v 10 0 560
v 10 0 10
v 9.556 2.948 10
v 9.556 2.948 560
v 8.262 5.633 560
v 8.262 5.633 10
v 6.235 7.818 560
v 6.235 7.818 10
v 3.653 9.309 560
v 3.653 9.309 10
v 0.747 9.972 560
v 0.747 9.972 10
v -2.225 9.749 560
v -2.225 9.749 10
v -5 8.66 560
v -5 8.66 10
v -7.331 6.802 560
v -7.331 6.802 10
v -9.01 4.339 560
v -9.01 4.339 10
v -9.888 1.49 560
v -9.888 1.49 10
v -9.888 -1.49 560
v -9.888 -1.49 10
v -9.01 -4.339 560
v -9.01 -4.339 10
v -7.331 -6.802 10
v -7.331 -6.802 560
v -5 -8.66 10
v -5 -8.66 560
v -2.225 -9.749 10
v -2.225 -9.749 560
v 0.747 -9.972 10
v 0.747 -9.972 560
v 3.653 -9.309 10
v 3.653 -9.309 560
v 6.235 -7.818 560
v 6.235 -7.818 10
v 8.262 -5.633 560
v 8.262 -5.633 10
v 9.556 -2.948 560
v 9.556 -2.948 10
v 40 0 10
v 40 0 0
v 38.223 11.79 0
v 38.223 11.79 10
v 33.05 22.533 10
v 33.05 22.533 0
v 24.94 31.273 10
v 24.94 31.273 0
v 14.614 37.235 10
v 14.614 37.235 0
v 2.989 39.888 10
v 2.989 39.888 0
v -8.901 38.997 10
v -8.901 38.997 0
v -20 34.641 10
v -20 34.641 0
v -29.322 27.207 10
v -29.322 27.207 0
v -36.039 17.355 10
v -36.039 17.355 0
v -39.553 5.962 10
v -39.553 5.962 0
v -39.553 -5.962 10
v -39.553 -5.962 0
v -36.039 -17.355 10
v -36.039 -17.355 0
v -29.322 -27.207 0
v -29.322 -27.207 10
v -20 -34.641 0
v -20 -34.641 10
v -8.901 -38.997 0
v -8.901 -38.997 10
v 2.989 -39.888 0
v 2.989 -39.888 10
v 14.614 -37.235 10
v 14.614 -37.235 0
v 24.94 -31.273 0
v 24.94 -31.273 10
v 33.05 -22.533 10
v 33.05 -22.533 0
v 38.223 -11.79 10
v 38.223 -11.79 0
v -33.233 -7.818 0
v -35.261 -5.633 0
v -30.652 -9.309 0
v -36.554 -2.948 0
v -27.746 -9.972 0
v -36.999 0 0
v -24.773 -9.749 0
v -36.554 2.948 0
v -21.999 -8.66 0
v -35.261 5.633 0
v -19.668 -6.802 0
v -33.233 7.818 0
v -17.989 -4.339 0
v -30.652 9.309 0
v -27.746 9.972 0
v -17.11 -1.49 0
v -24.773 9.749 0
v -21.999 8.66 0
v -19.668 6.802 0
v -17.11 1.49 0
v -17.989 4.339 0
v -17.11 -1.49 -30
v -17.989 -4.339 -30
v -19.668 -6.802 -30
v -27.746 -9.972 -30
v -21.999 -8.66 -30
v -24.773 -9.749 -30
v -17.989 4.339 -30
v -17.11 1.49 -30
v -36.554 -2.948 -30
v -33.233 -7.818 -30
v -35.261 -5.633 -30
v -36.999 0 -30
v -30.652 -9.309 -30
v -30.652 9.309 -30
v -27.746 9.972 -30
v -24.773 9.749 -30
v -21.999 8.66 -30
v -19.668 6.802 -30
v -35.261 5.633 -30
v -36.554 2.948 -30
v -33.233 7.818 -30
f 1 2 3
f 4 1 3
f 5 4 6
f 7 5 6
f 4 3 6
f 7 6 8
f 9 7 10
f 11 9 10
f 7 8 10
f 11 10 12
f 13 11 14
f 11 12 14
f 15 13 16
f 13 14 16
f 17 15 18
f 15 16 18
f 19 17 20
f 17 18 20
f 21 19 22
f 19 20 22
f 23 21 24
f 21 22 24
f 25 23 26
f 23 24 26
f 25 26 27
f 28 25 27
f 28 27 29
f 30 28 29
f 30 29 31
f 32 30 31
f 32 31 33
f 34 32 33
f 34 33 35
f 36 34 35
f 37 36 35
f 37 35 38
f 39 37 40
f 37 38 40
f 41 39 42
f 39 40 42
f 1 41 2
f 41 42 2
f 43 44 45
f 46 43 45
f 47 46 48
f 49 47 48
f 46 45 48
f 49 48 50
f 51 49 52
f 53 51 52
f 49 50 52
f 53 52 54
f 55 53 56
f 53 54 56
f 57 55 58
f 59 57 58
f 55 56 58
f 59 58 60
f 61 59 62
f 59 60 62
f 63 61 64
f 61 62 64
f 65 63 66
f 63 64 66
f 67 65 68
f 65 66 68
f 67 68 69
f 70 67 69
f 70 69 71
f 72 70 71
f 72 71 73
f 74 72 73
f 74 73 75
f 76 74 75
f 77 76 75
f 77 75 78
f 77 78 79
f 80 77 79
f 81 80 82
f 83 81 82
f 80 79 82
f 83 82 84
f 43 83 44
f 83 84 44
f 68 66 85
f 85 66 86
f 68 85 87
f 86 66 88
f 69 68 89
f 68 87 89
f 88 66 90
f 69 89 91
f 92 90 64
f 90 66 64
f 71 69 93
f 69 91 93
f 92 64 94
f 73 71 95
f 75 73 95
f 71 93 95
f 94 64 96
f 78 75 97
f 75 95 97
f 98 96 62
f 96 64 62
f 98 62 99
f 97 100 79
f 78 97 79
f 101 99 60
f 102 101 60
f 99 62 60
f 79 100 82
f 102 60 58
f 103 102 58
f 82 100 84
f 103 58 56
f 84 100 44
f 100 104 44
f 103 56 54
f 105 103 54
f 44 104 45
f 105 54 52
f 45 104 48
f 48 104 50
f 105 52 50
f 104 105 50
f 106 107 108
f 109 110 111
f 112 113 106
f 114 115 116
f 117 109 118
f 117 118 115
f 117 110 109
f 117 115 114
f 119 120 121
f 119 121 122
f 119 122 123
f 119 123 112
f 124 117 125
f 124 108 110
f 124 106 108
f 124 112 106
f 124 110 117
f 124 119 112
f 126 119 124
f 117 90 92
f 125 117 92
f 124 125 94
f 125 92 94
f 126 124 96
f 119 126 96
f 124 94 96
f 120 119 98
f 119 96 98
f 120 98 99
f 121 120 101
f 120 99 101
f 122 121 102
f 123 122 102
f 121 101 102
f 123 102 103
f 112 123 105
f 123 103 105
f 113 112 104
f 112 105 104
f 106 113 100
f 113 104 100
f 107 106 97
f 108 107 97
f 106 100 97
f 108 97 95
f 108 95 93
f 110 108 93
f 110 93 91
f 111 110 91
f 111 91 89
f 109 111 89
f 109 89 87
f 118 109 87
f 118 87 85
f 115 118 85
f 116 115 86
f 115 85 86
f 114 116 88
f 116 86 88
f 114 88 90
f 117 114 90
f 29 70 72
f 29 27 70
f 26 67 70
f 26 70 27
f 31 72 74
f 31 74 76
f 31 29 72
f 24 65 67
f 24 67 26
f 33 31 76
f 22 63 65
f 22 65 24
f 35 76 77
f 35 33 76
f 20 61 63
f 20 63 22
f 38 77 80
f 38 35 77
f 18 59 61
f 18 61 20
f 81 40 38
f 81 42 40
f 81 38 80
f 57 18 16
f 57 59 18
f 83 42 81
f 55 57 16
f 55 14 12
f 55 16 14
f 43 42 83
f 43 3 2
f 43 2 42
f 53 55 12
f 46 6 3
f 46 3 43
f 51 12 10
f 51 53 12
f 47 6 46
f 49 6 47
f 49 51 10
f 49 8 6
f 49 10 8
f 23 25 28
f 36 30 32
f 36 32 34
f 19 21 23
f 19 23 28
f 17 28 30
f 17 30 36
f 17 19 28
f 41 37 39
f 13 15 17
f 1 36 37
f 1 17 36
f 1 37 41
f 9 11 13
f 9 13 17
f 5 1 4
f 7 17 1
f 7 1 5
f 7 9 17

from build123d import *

# Parameters (mm, degrees)
SKETCH1_R           = 40
BOSS_EXTRUDE1_DEPTH = 10
SKETCH2_R           = 10
BOSS_EXTRUDE2_DEPTH = 550
SKETCH3_R           = 10
BOSS_EXTRUDE3_DEPTH = 30


with BuildPart() as part:
    # Sketch1 → Boss-Extrude1 (new body)
    with BuildSketch(Plane.XY):
        Circle(SKETCH1_R)
    extrude(amount=BOSS_EXTRUDE1_DEPTH)

    # Sketch2 → Boss-Extrude2 (add)
    with BuildSketch(Plane.XY.offset(10)):
        Circle(SKETCH2_R)
    extrude(amount=BOSS_EXTRUDE2_DEPTH)

    # Sketch3 → Boss-Extrude3 (add)
    with BuildSketch(Plane(origin=(0, 0, 0), x_dir=(-1, 0, 0), z_dir=(0, 0, -1))):
        with Locations((26.998561916, 0)):
            Circle(SKETCH3_R)
    extrude(amount=BOSS_EXTRUDE3_DEPTH)


solid = part.part
